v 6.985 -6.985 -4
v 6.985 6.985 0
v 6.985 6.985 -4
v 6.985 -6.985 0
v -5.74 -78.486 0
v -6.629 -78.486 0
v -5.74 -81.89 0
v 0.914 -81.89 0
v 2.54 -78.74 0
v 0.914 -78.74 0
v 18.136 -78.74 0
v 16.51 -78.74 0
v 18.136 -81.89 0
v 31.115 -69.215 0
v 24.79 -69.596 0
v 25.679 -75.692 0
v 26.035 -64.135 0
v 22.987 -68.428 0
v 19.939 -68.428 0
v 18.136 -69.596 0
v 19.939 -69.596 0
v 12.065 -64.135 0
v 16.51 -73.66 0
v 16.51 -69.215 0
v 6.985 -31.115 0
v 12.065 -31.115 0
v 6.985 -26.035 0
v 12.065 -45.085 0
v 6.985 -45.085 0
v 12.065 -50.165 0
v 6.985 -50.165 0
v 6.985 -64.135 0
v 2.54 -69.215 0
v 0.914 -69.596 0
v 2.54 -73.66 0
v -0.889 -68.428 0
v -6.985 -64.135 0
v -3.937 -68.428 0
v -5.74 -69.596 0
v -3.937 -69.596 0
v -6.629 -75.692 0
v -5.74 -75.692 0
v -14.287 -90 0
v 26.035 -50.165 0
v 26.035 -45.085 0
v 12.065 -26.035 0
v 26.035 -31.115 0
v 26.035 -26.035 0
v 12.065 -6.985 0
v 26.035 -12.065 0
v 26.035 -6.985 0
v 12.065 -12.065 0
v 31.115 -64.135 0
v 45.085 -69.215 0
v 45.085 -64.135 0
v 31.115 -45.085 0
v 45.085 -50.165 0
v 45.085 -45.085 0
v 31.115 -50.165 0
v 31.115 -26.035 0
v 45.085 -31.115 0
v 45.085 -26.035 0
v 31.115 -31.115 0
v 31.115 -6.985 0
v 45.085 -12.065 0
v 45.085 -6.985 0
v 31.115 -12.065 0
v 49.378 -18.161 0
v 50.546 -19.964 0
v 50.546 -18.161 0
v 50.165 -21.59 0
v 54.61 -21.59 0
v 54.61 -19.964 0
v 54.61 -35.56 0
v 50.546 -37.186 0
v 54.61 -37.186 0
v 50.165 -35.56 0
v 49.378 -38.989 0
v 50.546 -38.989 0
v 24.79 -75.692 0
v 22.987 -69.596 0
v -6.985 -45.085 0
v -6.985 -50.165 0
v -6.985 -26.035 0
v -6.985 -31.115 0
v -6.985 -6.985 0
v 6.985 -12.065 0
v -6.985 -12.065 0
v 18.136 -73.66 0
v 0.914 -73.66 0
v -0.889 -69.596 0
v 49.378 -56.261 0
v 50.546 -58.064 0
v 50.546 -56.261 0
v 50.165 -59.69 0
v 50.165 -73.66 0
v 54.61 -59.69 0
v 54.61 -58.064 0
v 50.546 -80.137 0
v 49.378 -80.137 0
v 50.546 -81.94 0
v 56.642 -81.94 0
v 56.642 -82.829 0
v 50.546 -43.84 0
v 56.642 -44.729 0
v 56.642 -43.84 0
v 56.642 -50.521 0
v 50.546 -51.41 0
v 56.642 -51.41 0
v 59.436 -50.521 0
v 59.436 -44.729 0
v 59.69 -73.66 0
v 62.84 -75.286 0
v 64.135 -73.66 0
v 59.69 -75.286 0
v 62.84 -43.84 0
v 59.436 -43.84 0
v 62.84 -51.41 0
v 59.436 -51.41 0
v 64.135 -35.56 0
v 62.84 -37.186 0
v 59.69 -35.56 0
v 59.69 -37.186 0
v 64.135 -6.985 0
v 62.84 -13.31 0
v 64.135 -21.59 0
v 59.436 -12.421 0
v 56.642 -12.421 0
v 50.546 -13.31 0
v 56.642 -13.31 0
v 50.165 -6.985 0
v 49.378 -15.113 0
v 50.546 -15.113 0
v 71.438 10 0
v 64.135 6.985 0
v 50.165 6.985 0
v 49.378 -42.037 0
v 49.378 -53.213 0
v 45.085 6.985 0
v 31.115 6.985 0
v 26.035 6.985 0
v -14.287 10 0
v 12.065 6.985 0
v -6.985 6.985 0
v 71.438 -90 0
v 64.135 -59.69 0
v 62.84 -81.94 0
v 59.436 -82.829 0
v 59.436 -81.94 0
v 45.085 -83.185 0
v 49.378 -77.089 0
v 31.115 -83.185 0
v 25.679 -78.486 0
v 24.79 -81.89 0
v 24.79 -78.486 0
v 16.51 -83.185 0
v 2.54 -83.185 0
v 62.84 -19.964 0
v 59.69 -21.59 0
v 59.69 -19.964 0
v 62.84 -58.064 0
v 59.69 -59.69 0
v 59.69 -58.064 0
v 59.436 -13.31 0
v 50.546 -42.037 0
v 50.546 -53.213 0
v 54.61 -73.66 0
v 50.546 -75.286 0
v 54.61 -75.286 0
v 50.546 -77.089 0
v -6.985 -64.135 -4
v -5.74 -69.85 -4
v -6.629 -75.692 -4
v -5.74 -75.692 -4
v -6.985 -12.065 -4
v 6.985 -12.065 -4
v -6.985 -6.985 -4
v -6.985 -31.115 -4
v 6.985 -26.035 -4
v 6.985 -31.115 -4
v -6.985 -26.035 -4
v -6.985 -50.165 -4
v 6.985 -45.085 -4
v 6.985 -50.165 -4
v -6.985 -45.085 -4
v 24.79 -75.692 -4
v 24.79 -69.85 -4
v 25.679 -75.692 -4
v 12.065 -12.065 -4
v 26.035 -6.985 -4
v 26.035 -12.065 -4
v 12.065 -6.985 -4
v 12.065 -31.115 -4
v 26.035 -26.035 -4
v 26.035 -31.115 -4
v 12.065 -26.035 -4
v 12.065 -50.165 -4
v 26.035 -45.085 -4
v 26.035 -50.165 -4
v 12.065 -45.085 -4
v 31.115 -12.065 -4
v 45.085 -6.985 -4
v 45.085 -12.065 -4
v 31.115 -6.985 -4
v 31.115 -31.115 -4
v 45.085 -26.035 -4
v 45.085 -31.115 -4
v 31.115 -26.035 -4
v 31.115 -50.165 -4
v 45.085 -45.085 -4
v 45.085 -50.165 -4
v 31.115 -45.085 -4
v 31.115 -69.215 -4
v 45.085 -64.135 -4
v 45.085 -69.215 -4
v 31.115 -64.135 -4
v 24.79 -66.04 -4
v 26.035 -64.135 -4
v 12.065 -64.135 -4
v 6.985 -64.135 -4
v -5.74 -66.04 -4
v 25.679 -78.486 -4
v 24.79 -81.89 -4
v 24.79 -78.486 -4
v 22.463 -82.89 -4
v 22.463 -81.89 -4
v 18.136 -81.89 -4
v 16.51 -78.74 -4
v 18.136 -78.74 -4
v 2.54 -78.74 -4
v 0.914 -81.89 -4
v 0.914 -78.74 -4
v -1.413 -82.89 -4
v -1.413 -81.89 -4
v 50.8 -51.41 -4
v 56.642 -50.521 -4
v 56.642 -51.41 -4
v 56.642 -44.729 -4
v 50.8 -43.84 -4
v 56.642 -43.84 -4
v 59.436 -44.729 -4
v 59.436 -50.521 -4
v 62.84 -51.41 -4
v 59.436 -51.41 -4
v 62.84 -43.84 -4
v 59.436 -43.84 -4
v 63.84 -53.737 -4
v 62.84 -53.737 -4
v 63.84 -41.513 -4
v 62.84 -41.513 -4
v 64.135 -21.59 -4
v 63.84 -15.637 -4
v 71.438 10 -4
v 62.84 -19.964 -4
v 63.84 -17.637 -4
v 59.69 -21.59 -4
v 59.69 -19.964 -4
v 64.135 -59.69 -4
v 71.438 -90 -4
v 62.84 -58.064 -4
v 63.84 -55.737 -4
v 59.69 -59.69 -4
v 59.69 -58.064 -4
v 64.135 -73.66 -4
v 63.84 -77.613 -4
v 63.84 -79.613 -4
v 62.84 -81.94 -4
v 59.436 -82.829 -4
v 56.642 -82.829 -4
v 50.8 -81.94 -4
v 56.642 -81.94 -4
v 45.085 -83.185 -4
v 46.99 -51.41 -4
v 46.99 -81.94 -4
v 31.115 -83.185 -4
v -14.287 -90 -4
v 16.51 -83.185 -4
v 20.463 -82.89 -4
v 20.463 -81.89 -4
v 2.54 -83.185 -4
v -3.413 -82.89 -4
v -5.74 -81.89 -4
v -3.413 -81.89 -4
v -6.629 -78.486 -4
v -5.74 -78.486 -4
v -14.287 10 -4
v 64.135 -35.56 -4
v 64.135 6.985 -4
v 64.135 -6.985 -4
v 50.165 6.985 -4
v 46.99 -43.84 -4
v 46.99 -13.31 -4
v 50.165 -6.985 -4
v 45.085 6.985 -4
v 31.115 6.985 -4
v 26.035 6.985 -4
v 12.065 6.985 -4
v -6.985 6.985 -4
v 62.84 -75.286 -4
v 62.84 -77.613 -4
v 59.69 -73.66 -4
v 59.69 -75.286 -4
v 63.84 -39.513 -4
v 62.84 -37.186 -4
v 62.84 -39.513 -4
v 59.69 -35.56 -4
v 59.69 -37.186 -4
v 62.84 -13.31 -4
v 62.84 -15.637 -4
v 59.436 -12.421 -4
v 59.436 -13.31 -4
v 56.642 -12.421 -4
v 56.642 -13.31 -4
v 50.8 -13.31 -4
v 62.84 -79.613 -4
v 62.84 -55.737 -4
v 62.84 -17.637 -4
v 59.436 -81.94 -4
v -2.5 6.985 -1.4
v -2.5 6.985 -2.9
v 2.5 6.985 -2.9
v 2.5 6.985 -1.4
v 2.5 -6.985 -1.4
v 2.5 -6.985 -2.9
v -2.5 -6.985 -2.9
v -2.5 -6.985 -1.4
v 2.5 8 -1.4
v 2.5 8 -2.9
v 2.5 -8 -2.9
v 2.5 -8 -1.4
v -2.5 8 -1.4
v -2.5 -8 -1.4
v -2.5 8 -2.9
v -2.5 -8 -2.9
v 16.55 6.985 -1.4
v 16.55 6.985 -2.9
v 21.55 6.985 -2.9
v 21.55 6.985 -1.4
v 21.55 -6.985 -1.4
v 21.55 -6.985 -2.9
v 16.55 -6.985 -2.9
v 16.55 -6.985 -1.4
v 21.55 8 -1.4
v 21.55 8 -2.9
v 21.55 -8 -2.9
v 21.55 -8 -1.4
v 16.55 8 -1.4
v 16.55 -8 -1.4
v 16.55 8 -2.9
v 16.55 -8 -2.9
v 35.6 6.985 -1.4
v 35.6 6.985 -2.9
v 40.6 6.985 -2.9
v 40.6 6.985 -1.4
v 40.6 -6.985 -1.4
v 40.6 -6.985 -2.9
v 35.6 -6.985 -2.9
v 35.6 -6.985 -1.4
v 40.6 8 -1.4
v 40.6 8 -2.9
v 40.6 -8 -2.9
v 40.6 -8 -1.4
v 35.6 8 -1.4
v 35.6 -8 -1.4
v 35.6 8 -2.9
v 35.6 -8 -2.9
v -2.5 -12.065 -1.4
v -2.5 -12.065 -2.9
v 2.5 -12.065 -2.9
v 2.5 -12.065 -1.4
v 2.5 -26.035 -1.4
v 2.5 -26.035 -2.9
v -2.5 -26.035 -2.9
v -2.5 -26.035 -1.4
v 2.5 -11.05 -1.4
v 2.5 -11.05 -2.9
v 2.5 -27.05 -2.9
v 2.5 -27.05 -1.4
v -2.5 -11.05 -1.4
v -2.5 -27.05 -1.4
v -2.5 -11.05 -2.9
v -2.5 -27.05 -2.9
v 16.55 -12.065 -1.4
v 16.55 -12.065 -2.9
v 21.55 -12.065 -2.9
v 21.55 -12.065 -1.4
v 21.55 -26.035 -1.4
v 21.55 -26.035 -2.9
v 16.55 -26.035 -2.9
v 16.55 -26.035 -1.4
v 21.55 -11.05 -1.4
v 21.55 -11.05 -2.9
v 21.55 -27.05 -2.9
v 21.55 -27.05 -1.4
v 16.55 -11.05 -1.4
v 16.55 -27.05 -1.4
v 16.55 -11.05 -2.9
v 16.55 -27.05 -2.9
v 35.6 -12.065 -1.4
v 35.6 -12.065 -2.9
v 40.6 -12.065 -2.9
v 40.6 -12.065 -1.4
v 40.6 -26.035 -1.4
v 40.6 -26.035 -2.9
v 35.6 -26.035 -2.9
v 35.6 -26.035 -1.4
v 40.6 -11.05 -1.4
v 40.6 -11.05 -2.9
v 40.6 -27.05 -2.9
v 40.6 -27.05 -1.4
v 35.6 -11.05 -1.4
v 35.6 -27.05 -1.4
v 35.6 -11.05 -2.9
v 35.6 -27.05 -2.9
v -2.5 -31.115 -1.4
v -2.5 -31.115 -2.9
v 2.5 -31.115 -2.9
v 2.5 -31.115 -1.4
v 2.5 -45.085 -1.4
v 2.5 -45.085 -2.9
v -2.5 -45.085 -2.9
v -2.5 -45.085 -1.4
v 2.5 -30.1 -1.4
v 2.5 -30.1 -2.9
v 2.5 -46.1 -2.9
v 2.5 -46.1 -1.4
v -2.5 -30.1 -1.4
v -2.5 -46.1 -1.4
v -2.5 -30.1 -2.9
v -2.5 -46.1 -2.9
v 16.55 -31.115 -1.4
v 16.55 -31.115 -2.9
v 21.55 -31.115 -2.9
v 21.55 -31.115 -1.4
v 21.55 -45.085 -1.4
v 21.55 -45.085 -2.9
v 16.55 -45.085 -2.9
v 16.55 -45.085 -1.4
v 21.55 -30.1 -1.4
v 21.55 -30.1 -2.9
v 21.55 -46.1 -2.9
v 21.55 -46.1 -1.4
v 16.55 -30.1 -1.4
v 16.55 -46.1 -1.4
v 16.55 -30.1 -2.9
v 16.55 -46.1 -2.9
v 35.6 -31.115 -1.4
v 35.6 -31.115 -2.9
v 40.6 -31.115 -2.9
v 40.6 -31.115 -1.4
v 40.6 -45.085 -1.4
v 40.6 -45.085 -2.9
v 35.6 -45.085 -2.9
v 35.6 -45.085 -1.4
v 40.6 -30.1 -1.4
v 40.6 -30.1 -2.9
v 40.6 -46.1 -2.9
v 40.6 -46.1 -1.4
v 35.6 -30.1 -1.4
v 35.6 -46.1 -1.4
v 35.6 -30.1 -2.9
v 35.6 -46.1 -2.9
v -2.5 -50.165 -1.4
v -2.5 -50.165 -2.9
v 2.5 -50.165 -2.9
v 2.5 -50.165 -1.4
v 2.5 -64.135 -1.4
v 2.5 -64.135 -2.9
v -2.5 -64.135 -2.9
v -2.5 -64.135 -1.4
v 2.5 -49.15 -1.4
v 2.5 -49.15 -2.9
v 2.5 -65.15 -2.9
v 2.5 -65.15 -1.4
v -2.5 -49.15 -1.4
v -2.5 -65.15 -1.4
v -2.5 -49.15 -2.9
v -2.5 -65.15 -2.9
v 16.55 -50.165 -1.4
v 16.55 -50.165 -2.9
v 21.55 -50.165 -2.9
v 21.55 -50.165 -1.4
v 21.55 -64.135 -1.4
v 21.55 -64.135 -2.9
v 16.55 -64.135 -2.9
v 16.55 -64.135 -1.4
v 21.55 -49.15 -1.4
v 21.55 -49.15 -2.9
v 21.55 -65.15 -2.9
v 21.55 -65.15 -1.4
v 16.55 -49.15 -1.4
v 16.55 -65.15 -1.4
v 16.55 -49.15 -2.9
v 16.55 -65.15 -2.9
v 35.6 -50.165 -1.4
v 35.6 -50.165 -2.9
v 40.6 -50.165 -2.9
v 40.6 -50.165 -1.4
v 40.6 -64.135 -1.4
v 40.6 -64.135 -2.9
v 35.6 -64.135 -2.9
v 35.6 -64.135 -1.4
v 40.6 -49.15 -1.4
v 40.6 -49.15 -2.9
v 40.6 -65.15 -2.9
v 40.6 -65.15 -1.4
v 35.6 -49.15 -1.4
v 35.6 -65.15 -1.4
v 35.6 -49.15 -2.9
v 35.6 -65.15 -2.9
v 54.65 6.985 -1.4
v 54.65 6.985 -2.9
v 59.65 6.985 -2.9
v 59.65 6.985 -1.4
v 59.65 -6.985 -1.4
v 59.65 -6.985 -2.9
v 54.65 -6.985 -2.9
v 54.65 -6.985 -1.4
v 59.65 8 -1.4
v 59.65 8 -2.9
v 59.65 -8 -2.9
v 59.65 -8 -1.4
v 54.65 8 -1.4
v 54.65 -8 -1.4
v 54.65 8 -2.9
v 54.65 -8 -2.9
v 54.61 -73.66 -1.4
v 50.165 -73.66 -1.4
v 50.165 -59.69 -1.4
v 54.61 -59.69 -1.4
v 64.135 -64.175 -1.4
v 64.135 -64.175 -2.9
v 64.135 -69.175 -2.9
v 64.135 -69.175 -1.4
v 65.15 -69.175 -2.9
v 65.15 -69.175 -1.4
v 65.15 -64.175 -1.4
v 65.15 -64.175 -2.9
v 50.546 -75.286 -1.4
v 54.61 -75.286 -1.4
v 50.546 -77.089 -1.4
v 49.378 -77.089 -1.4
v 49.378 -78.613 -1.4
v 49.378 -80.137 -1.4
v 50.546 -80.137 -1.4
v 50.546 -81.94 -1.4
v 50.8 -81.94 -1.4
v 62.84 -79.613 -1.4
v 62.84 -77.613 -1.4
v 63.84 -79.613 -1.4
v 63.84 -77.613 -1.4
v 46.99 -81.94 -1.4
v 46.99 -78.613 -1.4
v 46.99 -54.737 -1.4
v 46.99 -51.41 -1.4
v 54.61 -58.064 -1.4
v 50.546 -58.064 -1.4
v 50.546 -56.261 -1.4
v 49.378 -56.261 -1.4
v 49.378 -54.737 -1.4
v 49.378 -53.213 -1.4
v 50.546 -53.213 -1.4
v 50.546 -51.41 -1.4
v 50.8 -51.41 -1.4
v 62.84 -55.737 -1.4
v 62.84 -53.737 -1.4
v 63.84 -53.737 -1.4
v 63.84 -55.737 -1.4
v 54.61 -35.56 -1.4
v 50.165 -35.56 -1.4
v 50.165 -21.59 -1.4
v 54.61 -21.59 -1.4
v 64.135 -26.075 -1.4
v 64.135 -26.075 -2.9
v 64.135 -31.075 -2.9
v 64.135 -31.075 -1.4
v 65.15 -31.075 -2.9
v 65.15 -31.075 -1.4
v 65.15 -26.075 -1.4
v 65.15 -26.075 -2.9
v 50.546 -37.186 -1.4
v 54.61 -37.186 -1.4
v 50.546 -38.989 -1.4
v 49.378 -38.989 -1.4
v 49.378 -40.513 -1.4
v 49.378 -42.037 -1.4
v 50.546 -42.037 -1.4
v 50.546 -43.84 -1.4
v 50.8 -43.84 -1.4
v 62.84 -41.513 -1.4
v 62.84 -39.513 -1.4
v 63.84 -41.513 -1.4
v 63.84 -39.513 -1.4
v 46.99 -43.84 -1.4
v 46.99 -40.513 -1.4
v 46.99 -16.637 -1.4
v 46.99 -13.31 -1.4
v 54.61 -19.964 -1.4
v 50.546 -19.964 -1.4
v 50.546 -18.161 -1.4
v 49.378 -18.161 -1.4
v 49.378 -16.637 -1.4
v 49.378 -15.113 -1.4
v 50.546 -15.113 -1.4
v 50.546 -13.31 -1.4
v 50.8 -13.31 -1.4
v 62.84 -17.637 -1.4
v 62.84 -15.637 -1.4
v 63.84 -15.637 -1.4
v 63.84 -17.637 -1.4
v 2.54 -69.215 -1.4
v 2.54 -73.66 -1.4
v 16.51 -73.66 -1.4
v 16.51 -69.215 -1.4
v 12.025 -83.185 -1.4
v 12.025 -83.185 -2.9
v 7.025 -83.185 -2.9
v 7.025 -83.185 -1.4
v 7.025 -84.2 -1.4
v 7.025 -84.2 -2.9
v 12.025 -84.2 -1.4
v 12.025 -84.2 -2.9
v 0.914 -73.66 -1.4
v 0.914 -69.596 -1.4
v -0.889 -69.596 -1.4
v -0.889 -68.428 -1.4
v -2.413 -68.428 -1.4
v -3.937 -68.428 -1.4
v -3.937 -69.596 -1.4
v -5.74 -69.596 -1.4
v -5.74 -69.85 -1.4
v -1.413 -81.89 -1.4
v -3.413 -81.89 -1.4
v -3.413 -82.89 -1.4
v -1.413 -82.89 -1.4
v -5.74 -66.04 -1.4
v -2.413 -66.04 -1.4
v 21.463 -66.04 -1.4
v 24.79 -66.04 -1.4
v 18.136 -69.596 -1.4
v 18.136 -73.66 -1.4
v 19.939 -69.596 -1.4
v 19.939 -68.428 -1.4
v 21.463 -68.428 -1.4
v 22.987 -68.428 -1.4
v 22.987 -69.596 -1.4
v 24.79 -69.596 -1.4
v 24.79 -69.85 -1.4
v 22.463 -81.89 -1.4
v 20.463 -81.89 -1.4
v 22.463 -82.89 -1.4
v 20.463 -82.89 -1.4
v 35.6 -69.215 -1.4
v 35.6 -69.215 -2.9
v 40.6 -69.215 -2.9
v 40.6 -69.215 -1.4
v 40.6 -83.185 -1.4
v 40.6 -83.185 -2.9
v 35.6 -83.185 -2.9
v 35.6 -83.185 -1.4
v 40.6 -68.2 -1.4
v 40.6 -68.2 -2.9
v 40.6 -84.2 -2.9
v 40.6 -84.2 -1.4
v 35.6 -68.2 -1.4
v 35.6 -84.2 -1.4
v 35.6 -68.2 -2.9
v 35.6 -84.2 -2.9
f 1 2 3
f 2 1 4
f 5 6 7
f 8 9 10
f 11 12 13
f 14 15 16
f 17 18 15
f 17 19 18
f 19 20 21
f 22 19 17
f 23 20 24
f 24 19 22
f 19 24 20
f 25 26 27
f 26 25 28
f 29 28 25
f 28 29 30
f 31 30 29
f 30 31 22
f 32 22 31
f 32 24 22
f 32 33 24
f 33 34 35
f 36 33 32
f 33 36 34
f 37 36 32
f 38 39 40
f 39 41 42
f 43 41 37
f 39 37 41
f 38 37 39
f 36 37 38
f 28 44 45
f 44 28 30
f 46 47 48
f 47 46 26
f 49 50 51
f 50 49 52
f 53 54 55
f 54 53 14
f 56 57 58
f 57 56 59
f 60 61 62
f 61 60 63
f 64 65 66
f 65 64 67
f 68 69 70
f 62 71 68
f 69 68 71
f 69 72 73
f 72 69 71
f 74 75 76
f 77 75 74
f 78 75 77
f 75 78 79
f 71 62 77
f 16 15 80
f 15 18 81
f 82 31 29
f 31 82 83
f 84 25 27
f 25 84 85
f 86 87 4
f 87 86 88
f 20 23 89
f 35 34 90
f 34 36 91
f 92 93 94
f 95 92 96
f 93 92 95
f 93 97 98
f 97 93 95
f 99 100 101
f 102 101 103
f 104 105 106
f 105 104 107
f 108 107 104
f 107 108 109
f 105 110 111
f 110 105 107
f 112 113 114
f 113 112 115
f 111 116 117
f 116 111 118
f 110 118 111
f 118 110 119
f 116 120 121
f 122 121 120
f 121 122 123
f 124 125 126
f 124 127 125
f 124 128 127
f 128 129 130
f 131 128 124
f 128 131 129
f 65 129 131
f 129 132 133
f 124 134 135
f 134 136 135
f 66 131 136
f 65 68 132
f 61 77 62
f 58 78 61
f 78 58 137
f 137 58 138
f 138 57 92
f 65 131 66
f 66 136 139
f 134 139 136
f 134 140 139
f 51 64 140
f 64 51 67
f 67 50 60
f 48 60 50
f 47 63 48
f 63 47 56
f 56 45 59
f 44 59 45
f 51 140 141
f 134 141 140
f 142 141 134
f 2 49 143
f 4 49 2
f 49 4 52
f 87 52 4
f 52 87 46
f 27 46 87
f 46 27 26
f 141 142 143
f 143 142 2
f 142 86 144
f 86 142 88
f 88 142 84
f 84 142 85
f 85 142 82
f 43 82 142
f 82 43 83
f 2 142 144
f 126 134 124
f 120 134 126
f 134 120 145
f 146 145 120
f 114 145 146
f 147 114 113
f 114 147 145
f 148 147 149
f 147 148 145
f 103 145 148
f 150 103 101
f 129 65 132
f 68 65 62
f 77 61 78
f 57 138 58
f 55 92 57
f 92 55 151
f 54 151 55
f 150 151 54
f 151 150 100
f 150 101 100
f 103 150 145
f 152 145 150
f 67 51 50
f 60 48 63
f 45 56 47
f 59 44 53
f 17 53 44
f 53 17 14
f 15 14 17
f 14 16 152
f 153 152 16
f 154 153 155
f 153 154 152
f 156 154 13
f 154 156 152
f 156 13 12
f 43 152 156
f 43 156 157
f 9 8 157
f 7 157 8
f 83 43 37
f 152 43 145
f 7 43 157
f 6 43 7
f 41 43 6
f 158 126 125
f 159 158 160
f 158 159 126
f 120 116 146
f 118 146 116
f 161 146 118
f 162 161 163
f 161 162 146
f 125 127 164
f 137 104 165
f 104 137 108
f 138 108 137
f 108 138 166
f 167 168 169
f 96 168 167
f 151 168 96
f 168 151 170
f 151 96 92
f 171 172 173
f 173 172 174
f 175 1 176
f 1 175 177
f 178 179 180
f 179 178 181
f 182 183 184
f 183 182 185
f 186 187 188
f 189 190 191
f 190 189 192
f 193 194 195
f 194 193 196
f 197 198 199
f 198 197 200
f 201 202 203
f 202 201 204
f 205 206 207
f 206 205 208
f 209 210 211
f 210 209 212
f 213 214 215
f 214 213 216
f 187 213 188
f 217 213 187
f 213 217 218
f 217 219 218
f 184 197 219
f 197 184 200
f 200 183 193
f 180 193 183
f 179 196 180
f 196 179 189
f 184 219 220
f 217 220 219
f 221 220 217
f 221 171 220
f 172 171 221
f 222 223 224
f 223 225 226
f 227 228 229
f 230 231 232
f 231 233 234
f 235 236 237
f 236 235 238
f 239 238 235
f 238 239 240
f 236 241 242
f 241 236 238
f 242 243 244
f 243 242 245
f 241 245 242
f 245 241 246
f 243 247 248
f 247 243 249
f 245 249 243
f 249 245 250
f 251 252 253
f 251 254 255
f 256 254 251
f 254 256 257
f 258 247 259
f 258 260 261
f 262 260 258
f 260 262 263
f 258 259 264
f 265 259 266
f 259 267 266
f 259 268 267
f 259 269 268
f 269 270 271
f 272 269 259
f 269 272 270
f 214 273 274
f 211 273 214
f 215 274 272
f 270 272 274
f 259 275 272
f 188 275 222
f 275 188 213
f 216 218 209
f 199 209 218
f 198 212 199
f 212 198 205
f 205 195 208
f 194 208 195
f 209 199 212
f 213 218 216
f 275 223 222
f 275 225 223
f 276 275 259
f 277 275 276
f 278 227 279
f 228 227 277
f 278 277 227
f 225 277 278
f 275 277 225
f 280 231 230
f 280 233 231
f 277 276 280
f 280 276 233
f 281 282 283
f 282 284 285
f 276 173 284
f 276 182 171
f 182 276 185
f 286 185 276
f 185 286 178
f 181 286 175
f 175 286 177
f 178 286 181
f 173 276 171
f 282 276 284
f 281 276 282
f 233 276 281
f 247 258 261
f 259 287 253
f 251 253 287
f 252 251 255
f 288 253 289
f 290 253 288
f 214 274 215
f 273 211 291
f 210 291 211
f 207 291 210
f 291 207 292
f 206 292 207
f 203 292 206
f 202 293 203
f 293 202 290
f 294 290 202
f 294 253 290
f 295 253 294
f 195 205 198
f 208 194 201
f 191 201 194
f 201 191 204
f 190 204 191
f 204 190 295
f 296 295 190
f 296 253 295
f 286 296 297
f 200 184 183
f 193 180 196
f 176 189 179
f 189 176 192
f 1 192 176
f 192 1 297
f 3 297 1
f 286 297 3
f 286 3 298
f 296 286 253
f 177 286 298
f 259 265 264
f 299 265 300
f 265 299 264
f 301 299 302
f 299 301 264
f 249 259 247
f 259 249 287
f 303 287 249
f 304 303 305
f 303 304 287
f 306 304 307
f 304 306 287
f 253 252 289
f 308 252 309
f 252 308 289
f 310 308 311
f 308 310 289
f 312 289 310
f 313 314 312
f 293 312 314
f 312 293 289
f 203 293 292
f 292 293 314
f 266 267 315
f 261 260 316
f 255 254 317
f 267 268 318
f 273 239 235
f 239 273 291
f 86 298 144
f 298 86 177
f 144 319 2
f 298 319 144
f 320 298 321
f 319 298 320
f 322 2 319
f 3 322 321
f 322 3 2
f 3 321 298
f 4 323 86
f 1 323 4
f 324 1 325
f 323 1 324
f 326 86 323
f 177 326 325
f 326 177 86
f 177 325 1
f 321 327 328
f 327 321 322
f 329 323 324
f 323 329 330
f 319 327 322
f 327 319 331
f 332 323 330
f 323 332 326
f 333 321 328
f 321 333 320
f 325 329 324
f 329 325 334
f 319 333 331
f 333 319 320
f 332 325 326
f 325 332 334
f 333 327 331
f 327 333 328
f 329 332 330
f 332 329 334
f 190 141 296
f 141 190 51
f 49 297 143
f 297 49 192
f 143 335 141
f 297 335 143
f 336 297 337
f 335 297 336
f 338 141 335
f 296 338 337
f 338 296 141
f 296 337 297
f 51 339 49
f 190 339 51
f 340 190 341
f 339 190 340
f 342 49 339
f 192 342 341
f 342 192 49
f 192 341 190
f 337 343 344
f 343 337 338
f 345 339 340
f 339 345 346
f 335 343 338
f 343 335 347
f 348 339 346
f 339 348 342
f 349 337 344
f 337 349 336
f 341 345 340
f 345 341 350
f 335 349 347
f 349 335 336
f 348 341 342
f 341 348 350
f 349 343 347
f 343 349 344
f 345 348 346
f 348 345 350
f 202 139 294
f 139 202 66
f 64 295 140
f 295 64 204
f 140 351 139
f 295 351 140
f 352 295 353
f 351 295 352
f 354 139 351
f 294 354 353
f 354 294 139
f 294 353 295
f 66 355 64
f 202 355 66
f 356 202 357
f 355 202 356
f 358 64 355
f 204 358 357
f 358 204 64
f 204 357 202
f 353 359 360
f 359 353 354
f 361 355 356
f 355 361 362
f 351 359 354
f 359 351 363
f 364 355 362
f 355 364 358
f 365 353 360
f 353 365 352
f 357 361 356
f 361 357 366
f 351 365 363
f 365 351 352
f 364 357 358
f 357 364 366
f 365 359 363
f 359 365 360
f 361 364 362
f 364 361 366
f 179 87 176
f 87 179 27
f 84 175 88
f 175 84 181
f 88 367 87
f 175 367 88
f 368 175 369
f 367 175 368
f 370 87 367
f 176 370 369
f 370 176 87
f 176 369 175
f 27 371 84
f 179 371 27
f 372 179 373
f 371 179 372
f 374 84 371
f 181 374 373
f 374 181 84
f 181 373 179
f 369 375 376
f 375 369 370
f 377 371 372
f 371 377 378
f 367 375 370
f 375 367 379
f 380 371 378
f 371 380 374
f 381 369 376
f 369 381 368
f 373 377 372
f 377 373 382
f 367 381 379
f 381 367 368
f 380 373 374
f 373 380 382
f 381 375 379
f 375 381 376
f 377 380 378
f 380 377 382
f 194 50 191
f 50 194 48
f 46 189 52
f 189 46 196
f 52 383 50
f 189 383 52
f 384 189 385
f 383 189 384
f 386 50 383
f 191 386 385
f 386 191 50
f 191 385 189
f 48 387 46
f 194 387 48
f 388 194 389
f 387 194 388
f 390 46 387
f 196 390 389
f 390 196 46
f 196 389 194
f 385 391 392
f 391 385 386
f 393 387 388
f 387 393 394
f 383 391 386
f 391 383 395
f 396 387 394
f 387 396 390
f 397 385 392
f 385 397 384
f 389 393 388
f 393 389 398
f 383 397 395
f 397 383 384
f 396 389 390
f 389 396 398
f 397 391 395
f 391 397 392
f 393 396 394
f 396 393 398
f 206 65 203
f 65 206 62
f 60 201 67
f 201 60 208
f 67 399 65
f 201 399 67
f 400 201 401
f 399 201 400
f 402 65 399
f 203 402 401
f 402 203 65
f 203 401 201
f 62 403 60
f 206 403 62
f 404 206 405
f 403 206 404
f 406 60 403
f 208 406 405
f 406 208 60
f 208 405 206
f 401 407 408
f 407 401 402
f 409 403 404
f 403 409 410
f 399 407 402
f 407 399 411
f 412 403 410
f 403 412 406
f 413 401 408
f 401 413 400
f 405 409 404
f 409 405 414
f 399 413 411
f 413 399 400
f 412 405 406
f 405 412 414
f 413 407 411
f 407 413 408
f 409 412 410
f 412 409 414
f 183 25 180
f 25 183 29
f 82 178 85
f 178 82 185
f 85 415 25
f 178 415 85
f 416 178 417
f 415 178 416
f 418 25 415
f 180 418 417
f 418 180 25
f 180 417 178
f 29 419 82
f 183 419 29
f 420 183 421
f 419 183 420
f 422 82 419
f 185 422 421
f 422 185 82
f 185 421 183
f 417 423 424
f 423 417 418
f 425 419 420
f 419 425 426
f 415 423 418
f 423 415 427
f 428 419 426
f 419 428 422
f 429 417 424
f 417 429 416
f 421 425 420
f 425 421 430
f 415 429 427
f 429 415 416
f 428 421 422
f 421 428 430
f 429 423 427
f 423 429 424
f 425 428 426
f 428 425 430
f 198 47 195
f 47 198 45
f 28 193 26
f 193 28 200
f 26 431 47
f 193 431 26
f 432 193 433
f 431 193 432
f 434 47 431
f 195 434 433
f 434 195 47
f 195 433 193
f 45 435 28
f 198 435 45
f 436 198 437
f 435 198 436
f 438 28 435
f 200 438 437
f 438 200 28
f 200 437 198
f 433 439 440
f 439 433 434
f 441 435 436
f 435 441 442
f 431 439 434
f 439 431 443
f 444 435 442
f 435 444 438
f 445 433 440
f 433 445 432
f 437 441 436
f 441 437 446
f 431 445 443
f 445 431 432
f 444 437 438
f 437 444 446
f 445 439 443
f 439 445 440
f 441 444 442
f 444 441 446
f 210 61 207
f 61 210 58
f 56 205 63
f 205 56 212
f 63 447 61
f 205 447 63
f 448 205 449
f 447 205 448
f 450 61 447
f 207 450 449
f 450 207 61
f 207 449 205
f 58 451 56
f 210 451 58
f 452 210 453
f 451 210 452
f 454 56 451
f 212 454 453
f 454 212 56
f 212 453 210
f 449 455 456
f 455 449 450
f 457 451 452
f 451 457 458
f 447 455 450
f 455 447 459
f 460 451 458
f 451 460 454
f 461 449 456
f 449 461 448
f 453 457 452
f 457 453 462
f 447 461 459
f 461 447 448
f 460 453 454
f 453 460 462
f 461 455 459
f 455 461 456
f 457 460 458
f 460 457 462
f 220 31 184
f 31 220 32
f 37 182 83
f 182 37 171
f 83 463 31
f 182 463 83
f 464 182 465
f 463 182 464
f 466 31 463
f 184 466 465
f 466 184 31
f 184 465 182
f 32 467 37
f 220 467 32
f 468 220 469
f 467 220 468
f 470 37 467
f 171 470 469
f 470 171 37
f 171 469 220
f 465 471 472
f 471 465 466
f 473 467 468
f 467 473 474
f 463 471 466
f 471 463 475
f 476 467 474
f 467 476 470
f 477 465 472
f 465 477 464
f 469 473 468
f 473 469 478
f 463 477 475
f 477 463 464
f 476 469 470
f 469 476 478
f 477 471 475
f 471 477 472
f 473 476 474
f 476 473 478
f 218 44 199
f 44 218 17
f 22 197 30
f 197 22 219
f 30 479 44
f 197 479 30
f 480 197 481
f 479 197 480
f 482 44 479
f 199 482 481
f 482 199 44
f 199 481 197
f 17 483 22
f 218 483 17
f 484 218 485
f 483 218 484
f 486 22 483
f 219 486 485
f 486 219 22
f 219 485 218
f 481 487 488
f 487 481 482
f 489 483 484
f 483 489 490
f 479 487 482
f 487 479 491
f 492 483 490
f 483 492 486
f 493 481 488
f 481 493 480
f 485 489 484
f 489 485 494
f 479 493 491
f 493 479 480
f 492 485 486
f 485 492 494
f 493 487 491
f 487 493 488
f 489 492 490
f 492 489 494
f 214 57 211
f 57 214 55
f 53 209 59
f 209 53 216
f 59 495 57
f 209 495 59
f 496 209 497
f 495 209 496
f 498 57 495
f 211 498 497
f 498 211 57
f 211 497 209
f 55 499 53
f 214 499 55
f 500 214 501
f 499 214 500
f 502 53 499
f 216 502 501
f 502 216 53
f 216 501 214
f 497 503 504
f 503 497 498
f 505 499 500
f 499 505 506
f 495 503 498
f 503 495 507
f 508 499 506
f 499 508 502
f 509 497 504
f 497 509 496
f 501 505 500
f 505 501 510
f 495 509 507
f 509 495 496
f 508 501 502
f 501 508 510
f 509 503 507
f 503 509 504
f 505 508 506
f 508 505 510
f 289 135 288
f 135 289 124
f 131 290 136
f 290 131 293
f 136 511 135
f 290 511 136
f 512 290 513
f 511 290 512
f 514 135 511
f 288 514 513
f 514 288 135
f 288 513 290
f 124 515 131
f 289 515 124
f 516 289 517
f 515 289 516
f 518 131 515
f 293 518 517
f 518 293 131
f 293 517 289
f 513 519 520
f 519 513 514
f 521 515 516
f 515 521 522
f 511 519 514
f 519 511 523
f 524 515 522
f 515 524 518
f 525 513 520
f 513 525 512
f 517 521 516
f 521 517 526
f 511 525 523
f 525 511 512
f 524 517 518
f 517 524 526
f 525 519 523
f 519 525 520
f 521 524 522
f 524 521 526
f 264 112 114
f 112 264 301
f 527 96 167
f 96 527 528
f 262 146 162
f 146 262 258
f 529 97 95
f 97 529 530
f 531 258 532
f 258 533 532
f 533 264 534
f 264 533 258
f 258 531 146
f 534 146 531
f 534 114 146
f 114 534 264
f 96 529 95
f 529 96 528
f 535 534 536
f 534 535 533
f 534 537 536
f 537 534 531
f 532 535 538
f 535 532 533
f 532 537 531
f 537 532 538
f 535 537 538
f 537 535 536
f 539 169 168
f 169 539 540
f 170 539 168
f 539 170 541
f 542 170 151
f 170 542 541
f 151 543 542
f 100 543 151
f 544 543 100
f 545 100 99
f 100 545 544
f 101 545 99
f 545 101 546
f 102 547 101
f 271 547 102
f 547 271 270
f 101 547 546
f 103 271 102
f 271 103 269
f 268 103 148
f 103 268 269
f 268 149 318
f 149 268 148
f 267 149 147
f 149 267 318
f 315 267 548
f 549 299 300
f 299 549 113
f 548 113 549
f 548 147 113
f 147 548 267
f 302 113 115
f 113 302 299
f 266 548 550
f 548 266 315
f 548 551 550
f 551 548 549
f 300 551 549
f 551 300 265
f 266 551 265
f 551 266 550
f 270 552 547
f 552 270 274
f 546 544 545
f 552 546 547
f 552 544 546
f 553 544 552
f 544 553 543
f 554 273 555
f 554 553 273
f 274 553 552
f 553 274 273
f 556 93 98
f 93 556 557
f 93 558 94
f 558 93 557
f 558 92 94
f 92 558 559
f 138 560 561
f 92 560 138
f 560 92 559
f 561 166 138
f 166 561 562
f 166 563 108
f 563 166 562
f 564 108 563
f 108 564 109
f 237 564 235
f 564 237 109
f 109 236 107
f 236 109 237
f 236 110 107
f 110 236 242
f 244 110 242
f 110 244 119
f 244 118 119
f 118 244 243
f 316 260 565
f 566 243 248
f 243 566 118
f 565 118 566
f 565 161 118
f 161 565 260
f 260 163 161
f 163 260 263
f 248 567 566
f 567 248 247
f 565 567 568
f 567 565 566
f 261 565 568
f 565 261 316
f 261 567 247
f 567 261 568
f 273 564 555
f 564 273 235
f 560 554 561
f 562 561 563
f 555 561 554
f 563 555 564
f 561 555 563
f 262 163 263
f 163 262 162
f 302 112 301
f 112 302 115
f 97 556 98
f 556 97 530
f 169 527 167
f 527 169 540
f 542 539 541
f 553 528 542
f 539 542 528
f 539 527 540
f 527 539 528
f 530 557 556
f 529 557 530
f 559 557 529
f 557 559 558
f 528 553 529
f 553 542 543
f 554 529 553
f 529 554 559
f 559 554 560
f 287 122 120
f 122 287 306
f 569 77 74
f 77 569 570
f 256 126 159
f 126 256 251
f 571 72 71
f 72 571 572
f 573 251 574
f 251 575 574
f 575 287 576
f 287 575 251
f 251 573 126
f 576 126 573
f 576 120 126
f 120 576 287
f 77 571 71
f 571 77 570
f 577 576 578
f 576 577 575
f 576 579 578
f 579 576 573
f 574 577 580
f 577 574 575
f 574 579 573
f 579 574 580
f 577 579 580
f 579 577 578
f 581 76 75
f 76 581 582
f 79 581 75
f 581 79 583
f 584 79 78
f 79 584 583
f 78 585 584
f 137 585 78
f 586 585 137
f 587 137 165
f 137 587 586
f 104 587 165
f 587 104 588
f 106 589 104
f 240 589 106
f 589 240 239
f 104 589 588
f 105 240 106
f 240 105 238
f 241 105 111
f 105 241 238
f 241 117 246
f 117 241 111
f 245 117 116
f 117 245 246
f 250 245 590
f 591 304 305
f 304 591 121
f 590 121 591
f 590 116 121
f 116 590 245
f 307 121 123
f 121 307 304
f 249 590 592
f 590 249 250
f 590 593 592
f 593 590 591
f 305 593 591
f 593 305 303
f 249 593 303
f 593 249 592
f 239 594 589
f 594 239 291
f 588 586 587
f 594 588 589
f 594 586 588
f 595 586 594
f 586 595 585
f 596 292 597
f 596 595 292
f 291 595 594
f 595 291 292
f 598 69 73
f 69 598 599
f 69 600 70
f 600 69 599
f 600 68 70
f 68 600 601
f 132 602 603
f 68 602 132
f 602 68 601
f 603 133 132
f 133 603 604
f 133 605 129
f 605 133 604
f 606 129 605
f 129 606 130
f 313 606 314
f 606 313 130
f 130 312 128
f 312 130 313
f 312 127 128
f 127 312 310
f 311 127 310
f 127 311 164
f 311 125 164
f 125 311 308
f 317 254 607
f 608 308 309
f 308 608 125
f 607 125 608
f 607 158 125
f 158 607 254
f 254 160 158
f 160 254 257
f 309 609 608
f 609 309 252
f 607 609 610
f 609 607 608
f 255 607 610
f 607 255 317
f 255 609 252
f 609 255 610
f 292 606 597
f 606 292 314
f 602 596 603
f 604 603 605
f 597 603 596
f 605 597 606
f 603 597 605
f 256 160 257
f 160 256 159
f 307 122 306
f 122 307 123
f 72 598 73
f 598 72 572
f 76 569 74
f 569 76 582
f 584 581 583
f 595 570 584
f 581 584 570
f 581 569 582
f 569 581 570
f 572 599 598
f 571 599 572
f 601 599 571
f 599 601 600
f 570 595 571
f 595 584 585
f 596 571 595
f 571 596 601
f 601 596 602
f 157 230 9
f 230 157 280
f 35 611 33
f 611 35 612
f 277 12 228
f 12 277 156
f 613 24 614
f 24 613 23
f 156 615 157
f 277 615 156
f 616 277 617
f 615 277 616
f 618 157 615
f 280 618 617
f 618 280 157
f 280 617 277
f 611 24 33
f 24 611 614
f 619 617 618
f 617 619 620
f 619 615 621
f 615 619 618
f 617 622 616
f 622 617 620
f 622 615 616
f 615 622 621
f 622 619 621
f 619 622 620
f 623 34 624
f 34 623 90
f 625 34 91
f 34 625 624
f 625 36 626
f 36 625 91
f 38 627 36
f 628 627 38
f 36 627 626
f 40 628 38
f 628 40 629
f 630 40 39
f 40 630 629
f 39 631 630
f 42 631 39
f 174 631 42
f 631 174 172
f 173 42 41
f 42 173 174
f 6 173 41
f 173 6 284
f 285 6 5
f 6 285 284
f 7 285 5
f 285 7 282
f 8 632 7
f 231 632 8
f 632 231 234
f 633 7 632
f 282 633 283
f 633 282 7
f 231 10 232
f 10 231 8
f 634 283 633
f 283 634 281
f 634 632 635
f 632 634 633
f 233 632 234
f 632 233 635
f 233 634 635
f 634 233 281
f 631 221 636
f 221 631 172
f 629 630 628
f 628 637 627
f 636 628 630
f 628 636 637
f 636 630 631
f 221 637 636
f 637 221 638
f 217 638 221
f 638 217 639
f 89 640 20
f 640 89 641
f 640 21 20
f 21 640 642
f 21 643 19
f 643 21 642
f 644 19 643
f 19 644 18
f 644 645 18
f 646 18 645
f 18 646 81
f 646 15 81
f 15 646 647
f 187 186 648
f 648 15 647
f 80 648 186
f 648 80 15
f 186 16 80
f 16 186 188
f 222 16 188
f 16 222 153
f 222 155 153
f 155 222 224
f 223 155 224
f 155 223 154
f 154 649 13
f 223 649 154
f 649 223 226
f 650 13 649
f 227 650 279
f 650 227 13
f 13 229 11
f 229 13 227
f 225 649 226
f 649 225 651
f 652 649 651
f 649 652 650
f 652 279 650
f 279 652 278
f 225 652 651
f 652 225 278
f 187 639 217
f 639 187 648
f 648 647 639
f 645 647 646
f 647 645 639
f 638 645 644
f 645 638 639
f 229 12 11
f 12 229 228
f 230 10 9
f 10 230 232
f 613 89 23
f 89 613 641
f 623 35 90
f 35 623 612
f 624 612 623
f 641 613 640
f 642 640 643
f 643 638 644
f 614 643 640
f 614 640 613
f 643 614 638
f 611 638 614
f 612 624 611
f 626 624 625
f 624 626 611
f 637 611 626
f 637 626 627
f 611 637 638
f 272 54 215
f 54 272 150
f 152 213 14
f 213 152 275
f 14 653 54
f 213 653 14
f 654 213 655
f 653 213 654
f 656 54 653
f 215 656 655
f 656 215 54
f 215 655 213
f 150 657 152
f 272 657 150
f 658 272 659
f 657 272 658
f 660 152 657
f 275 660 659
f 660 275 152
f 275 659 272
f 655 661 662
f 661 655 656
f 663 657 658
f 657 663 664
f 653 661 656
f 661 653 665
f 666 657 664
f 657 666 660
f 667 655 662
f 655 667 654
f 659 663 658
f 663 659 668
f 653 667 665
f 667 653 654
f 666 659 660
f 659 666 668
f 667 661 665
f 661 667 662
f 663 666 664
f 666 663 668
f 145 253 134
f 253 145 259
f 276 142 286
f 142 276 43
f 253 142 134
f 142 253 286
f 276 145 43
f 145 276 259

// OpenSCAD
// file: module_switch.scad
//all units are in mm
//since datasheet units are in inches,
//there's a simple convertion function in()
//TODO:
//tolerance
//better names
//1u = 0,75"
//sets and offset in z axis for switch mounting cutouts
//0.1 is recommended
z_offset = 0.1;
switch_cutout_type = 0;
//simple conversion fuction inch to milimeters
function in(mm) = mm*25.4;
function u(unit) = unit*0.75;
//
module mirror_copy(v = [1, 0, 0])
{
    children();
    mirror(v) children();
}
//EXtendedCUBE
//allows to choose an axis on which the cube will be centered
module excube(a = [1,1,1],b = [0,0,0])
{
    translate([-b[0]*a[0]/2,-b[1]*a[1]/2,-b[2]*a[2]/2])
        cube(a);
}
//simple line
module line(start, end, thickness = 1) {
    hull() {
        translate(start) sphere(thickness);
        translate(end) sphere(thickness);
    }
}
//definition of single switch cutout
//with small cutout for switch's latch (maybe it could be smaller?)
//two types
module switch_part()
{
    if(switch_cutout_type)
        translate([0,0,-4])
            union()
            {
                excube([in(0.55),in(0.55),4], [1,1,0]);
                excube([5,16,2.5+z_offset], [1,1,0]);
            }
    else
        translate([0,0,-4])
            union()
            {
                excube([in(0.55),in(0.55),4], [1,1,0]);
                translate([0,0,1+z_offset])
                    excube([5,16,1.5], [1,1,0]);
            }
    
}
//definition of single cutout for stabiliser
//also with small cutout for switch's latch and bar section
module stabiliser_part()
{
    translate([0,0,-4])
        union()
        {
            linear_extrude(4)
                mirror_copy()
                    polygon(points=[
                        [in(0),-in(0.26+0.046)],
                        [-in(0.06),-in(0.26+0.046)],
                        [-in(0.06),-in(0.26)],
                        [-in(0.131),-in(0.26)],
                        [-in(0.131),-in(0.02)],
                        [-in(0.166),-in(0.02)],
                        [-in(0.166),in(0.11-0.02)],
                        [-in(0.131),in(0.11-0.02)],
                        [-in(0.131),in(0.224)],
                        [in(0),in(0.224)]]);
            translate([0,in(0.224),0])
                excube([2,2,2.5+z_offset], [1,1,0]);
            translate([0,-in(0.26)-in(0.14),0])
                excube([in(0.262),in(0.15),2.5+z_offset], [1,0,0]);
        }
}
//cutout definition for the rest of the stabiliser
module stabiliser_cutout(a = 0.94)
{
    union()
    {
        translate([0,0,-4])
            excube([in(a),in(0.2),4],[1,1,0]);
        translate([0,-in(0.26)-in(0.14),-4])
            excube([in(a),in(0.26)+in(0.14),2.5+z_offset],[1,0,0]);
    }
}
//------------------------------------------------
//switch assemblers

//accepts A diemension (distance between 
//centers of the stabiliser moutings)
module stabiliser(a = 0.94)
{
    mirror_copy()
        translate([in(a/2),0,0])
            stabiliser_part();
    stabiliser_cutout(a);
}
//still in progress, but should work for siple keys 
//1u , 2-2,75u , 6,25u spacebar
module switch(size = 1)
{
    //single switch
    if(size == 1)
    {
        switch_part();
    }
    else
    //there should be a better way
    if(size == 2 || size == 2.25 || size == 2.5 || size == 2.75)
    {
        union()
        {
            switch_part();
            stabiliser();
        }
    }
    //here too
    else
    {
        //size = (0.75*size)-0.75;
        //size = u(size)-u(1);
        //so far should work for 6.25u spacebar
        size = u(size-1);
        union()
        {
            switch_part();
            stabiliser(size);
        }
    }
}

module switch_asm(x, y, , size = 1, rotation = 0)
{
    translate([in(u(x)), in(u(y)), 0])
        rotate(a = rotation, v = [0, 0, 1])
            switch(size);
}
//test union, remove * to see
union()
{
    translate([0, 0, 0])
        switch();
    translate([0, in(u(1)), 0])
        switch(2);
    translate([0, in(u(2)), 0])
        switch(6.25);
    translate([0, in(u(3)), 0])
        stabiliser();
}

//switch_asm(0.5,0.5,2,90);

/*just some scrap to remove later
module switch_constructor(type)
    if(type == 6.25)
    {
        union()
        {
            switch();
            mirror_copy()
            translate([in(3.9375/2),0,0])
                stabiliser();
            stabiliser_cutout(3.9375);
        }
    }
*/
// main file
use <module_switch.scad>;

difference()
{
    translate([-14.2875,-40,-4])
    excube([85.725,100,4],[0,1,0]);
union(){
for (a=[0:3])
{   
    for (i=[0:2])
    {
        translate([(i*0.75*25.4),(-a*0.75*25.4),0])  
            switch(1);
    }
}
translate([(3*in(0.75)),0,0])
    switch(1);
translate([(3*in(0.75)),-3.5*in(0.75),0])
    rotate(a=-90)
        switch(2);
translate([(3*in(0.75)),-1.5*in(0.75),0])
    rotate(a=-90)
        switch(2);
translate([(0.5*in(0.75)),-4*in(0.75),0])
    rotate(a=180)
        switch(2);
translate([(2*in(0.75)),-4*in(0.75),0])
        switch(1);
}}
